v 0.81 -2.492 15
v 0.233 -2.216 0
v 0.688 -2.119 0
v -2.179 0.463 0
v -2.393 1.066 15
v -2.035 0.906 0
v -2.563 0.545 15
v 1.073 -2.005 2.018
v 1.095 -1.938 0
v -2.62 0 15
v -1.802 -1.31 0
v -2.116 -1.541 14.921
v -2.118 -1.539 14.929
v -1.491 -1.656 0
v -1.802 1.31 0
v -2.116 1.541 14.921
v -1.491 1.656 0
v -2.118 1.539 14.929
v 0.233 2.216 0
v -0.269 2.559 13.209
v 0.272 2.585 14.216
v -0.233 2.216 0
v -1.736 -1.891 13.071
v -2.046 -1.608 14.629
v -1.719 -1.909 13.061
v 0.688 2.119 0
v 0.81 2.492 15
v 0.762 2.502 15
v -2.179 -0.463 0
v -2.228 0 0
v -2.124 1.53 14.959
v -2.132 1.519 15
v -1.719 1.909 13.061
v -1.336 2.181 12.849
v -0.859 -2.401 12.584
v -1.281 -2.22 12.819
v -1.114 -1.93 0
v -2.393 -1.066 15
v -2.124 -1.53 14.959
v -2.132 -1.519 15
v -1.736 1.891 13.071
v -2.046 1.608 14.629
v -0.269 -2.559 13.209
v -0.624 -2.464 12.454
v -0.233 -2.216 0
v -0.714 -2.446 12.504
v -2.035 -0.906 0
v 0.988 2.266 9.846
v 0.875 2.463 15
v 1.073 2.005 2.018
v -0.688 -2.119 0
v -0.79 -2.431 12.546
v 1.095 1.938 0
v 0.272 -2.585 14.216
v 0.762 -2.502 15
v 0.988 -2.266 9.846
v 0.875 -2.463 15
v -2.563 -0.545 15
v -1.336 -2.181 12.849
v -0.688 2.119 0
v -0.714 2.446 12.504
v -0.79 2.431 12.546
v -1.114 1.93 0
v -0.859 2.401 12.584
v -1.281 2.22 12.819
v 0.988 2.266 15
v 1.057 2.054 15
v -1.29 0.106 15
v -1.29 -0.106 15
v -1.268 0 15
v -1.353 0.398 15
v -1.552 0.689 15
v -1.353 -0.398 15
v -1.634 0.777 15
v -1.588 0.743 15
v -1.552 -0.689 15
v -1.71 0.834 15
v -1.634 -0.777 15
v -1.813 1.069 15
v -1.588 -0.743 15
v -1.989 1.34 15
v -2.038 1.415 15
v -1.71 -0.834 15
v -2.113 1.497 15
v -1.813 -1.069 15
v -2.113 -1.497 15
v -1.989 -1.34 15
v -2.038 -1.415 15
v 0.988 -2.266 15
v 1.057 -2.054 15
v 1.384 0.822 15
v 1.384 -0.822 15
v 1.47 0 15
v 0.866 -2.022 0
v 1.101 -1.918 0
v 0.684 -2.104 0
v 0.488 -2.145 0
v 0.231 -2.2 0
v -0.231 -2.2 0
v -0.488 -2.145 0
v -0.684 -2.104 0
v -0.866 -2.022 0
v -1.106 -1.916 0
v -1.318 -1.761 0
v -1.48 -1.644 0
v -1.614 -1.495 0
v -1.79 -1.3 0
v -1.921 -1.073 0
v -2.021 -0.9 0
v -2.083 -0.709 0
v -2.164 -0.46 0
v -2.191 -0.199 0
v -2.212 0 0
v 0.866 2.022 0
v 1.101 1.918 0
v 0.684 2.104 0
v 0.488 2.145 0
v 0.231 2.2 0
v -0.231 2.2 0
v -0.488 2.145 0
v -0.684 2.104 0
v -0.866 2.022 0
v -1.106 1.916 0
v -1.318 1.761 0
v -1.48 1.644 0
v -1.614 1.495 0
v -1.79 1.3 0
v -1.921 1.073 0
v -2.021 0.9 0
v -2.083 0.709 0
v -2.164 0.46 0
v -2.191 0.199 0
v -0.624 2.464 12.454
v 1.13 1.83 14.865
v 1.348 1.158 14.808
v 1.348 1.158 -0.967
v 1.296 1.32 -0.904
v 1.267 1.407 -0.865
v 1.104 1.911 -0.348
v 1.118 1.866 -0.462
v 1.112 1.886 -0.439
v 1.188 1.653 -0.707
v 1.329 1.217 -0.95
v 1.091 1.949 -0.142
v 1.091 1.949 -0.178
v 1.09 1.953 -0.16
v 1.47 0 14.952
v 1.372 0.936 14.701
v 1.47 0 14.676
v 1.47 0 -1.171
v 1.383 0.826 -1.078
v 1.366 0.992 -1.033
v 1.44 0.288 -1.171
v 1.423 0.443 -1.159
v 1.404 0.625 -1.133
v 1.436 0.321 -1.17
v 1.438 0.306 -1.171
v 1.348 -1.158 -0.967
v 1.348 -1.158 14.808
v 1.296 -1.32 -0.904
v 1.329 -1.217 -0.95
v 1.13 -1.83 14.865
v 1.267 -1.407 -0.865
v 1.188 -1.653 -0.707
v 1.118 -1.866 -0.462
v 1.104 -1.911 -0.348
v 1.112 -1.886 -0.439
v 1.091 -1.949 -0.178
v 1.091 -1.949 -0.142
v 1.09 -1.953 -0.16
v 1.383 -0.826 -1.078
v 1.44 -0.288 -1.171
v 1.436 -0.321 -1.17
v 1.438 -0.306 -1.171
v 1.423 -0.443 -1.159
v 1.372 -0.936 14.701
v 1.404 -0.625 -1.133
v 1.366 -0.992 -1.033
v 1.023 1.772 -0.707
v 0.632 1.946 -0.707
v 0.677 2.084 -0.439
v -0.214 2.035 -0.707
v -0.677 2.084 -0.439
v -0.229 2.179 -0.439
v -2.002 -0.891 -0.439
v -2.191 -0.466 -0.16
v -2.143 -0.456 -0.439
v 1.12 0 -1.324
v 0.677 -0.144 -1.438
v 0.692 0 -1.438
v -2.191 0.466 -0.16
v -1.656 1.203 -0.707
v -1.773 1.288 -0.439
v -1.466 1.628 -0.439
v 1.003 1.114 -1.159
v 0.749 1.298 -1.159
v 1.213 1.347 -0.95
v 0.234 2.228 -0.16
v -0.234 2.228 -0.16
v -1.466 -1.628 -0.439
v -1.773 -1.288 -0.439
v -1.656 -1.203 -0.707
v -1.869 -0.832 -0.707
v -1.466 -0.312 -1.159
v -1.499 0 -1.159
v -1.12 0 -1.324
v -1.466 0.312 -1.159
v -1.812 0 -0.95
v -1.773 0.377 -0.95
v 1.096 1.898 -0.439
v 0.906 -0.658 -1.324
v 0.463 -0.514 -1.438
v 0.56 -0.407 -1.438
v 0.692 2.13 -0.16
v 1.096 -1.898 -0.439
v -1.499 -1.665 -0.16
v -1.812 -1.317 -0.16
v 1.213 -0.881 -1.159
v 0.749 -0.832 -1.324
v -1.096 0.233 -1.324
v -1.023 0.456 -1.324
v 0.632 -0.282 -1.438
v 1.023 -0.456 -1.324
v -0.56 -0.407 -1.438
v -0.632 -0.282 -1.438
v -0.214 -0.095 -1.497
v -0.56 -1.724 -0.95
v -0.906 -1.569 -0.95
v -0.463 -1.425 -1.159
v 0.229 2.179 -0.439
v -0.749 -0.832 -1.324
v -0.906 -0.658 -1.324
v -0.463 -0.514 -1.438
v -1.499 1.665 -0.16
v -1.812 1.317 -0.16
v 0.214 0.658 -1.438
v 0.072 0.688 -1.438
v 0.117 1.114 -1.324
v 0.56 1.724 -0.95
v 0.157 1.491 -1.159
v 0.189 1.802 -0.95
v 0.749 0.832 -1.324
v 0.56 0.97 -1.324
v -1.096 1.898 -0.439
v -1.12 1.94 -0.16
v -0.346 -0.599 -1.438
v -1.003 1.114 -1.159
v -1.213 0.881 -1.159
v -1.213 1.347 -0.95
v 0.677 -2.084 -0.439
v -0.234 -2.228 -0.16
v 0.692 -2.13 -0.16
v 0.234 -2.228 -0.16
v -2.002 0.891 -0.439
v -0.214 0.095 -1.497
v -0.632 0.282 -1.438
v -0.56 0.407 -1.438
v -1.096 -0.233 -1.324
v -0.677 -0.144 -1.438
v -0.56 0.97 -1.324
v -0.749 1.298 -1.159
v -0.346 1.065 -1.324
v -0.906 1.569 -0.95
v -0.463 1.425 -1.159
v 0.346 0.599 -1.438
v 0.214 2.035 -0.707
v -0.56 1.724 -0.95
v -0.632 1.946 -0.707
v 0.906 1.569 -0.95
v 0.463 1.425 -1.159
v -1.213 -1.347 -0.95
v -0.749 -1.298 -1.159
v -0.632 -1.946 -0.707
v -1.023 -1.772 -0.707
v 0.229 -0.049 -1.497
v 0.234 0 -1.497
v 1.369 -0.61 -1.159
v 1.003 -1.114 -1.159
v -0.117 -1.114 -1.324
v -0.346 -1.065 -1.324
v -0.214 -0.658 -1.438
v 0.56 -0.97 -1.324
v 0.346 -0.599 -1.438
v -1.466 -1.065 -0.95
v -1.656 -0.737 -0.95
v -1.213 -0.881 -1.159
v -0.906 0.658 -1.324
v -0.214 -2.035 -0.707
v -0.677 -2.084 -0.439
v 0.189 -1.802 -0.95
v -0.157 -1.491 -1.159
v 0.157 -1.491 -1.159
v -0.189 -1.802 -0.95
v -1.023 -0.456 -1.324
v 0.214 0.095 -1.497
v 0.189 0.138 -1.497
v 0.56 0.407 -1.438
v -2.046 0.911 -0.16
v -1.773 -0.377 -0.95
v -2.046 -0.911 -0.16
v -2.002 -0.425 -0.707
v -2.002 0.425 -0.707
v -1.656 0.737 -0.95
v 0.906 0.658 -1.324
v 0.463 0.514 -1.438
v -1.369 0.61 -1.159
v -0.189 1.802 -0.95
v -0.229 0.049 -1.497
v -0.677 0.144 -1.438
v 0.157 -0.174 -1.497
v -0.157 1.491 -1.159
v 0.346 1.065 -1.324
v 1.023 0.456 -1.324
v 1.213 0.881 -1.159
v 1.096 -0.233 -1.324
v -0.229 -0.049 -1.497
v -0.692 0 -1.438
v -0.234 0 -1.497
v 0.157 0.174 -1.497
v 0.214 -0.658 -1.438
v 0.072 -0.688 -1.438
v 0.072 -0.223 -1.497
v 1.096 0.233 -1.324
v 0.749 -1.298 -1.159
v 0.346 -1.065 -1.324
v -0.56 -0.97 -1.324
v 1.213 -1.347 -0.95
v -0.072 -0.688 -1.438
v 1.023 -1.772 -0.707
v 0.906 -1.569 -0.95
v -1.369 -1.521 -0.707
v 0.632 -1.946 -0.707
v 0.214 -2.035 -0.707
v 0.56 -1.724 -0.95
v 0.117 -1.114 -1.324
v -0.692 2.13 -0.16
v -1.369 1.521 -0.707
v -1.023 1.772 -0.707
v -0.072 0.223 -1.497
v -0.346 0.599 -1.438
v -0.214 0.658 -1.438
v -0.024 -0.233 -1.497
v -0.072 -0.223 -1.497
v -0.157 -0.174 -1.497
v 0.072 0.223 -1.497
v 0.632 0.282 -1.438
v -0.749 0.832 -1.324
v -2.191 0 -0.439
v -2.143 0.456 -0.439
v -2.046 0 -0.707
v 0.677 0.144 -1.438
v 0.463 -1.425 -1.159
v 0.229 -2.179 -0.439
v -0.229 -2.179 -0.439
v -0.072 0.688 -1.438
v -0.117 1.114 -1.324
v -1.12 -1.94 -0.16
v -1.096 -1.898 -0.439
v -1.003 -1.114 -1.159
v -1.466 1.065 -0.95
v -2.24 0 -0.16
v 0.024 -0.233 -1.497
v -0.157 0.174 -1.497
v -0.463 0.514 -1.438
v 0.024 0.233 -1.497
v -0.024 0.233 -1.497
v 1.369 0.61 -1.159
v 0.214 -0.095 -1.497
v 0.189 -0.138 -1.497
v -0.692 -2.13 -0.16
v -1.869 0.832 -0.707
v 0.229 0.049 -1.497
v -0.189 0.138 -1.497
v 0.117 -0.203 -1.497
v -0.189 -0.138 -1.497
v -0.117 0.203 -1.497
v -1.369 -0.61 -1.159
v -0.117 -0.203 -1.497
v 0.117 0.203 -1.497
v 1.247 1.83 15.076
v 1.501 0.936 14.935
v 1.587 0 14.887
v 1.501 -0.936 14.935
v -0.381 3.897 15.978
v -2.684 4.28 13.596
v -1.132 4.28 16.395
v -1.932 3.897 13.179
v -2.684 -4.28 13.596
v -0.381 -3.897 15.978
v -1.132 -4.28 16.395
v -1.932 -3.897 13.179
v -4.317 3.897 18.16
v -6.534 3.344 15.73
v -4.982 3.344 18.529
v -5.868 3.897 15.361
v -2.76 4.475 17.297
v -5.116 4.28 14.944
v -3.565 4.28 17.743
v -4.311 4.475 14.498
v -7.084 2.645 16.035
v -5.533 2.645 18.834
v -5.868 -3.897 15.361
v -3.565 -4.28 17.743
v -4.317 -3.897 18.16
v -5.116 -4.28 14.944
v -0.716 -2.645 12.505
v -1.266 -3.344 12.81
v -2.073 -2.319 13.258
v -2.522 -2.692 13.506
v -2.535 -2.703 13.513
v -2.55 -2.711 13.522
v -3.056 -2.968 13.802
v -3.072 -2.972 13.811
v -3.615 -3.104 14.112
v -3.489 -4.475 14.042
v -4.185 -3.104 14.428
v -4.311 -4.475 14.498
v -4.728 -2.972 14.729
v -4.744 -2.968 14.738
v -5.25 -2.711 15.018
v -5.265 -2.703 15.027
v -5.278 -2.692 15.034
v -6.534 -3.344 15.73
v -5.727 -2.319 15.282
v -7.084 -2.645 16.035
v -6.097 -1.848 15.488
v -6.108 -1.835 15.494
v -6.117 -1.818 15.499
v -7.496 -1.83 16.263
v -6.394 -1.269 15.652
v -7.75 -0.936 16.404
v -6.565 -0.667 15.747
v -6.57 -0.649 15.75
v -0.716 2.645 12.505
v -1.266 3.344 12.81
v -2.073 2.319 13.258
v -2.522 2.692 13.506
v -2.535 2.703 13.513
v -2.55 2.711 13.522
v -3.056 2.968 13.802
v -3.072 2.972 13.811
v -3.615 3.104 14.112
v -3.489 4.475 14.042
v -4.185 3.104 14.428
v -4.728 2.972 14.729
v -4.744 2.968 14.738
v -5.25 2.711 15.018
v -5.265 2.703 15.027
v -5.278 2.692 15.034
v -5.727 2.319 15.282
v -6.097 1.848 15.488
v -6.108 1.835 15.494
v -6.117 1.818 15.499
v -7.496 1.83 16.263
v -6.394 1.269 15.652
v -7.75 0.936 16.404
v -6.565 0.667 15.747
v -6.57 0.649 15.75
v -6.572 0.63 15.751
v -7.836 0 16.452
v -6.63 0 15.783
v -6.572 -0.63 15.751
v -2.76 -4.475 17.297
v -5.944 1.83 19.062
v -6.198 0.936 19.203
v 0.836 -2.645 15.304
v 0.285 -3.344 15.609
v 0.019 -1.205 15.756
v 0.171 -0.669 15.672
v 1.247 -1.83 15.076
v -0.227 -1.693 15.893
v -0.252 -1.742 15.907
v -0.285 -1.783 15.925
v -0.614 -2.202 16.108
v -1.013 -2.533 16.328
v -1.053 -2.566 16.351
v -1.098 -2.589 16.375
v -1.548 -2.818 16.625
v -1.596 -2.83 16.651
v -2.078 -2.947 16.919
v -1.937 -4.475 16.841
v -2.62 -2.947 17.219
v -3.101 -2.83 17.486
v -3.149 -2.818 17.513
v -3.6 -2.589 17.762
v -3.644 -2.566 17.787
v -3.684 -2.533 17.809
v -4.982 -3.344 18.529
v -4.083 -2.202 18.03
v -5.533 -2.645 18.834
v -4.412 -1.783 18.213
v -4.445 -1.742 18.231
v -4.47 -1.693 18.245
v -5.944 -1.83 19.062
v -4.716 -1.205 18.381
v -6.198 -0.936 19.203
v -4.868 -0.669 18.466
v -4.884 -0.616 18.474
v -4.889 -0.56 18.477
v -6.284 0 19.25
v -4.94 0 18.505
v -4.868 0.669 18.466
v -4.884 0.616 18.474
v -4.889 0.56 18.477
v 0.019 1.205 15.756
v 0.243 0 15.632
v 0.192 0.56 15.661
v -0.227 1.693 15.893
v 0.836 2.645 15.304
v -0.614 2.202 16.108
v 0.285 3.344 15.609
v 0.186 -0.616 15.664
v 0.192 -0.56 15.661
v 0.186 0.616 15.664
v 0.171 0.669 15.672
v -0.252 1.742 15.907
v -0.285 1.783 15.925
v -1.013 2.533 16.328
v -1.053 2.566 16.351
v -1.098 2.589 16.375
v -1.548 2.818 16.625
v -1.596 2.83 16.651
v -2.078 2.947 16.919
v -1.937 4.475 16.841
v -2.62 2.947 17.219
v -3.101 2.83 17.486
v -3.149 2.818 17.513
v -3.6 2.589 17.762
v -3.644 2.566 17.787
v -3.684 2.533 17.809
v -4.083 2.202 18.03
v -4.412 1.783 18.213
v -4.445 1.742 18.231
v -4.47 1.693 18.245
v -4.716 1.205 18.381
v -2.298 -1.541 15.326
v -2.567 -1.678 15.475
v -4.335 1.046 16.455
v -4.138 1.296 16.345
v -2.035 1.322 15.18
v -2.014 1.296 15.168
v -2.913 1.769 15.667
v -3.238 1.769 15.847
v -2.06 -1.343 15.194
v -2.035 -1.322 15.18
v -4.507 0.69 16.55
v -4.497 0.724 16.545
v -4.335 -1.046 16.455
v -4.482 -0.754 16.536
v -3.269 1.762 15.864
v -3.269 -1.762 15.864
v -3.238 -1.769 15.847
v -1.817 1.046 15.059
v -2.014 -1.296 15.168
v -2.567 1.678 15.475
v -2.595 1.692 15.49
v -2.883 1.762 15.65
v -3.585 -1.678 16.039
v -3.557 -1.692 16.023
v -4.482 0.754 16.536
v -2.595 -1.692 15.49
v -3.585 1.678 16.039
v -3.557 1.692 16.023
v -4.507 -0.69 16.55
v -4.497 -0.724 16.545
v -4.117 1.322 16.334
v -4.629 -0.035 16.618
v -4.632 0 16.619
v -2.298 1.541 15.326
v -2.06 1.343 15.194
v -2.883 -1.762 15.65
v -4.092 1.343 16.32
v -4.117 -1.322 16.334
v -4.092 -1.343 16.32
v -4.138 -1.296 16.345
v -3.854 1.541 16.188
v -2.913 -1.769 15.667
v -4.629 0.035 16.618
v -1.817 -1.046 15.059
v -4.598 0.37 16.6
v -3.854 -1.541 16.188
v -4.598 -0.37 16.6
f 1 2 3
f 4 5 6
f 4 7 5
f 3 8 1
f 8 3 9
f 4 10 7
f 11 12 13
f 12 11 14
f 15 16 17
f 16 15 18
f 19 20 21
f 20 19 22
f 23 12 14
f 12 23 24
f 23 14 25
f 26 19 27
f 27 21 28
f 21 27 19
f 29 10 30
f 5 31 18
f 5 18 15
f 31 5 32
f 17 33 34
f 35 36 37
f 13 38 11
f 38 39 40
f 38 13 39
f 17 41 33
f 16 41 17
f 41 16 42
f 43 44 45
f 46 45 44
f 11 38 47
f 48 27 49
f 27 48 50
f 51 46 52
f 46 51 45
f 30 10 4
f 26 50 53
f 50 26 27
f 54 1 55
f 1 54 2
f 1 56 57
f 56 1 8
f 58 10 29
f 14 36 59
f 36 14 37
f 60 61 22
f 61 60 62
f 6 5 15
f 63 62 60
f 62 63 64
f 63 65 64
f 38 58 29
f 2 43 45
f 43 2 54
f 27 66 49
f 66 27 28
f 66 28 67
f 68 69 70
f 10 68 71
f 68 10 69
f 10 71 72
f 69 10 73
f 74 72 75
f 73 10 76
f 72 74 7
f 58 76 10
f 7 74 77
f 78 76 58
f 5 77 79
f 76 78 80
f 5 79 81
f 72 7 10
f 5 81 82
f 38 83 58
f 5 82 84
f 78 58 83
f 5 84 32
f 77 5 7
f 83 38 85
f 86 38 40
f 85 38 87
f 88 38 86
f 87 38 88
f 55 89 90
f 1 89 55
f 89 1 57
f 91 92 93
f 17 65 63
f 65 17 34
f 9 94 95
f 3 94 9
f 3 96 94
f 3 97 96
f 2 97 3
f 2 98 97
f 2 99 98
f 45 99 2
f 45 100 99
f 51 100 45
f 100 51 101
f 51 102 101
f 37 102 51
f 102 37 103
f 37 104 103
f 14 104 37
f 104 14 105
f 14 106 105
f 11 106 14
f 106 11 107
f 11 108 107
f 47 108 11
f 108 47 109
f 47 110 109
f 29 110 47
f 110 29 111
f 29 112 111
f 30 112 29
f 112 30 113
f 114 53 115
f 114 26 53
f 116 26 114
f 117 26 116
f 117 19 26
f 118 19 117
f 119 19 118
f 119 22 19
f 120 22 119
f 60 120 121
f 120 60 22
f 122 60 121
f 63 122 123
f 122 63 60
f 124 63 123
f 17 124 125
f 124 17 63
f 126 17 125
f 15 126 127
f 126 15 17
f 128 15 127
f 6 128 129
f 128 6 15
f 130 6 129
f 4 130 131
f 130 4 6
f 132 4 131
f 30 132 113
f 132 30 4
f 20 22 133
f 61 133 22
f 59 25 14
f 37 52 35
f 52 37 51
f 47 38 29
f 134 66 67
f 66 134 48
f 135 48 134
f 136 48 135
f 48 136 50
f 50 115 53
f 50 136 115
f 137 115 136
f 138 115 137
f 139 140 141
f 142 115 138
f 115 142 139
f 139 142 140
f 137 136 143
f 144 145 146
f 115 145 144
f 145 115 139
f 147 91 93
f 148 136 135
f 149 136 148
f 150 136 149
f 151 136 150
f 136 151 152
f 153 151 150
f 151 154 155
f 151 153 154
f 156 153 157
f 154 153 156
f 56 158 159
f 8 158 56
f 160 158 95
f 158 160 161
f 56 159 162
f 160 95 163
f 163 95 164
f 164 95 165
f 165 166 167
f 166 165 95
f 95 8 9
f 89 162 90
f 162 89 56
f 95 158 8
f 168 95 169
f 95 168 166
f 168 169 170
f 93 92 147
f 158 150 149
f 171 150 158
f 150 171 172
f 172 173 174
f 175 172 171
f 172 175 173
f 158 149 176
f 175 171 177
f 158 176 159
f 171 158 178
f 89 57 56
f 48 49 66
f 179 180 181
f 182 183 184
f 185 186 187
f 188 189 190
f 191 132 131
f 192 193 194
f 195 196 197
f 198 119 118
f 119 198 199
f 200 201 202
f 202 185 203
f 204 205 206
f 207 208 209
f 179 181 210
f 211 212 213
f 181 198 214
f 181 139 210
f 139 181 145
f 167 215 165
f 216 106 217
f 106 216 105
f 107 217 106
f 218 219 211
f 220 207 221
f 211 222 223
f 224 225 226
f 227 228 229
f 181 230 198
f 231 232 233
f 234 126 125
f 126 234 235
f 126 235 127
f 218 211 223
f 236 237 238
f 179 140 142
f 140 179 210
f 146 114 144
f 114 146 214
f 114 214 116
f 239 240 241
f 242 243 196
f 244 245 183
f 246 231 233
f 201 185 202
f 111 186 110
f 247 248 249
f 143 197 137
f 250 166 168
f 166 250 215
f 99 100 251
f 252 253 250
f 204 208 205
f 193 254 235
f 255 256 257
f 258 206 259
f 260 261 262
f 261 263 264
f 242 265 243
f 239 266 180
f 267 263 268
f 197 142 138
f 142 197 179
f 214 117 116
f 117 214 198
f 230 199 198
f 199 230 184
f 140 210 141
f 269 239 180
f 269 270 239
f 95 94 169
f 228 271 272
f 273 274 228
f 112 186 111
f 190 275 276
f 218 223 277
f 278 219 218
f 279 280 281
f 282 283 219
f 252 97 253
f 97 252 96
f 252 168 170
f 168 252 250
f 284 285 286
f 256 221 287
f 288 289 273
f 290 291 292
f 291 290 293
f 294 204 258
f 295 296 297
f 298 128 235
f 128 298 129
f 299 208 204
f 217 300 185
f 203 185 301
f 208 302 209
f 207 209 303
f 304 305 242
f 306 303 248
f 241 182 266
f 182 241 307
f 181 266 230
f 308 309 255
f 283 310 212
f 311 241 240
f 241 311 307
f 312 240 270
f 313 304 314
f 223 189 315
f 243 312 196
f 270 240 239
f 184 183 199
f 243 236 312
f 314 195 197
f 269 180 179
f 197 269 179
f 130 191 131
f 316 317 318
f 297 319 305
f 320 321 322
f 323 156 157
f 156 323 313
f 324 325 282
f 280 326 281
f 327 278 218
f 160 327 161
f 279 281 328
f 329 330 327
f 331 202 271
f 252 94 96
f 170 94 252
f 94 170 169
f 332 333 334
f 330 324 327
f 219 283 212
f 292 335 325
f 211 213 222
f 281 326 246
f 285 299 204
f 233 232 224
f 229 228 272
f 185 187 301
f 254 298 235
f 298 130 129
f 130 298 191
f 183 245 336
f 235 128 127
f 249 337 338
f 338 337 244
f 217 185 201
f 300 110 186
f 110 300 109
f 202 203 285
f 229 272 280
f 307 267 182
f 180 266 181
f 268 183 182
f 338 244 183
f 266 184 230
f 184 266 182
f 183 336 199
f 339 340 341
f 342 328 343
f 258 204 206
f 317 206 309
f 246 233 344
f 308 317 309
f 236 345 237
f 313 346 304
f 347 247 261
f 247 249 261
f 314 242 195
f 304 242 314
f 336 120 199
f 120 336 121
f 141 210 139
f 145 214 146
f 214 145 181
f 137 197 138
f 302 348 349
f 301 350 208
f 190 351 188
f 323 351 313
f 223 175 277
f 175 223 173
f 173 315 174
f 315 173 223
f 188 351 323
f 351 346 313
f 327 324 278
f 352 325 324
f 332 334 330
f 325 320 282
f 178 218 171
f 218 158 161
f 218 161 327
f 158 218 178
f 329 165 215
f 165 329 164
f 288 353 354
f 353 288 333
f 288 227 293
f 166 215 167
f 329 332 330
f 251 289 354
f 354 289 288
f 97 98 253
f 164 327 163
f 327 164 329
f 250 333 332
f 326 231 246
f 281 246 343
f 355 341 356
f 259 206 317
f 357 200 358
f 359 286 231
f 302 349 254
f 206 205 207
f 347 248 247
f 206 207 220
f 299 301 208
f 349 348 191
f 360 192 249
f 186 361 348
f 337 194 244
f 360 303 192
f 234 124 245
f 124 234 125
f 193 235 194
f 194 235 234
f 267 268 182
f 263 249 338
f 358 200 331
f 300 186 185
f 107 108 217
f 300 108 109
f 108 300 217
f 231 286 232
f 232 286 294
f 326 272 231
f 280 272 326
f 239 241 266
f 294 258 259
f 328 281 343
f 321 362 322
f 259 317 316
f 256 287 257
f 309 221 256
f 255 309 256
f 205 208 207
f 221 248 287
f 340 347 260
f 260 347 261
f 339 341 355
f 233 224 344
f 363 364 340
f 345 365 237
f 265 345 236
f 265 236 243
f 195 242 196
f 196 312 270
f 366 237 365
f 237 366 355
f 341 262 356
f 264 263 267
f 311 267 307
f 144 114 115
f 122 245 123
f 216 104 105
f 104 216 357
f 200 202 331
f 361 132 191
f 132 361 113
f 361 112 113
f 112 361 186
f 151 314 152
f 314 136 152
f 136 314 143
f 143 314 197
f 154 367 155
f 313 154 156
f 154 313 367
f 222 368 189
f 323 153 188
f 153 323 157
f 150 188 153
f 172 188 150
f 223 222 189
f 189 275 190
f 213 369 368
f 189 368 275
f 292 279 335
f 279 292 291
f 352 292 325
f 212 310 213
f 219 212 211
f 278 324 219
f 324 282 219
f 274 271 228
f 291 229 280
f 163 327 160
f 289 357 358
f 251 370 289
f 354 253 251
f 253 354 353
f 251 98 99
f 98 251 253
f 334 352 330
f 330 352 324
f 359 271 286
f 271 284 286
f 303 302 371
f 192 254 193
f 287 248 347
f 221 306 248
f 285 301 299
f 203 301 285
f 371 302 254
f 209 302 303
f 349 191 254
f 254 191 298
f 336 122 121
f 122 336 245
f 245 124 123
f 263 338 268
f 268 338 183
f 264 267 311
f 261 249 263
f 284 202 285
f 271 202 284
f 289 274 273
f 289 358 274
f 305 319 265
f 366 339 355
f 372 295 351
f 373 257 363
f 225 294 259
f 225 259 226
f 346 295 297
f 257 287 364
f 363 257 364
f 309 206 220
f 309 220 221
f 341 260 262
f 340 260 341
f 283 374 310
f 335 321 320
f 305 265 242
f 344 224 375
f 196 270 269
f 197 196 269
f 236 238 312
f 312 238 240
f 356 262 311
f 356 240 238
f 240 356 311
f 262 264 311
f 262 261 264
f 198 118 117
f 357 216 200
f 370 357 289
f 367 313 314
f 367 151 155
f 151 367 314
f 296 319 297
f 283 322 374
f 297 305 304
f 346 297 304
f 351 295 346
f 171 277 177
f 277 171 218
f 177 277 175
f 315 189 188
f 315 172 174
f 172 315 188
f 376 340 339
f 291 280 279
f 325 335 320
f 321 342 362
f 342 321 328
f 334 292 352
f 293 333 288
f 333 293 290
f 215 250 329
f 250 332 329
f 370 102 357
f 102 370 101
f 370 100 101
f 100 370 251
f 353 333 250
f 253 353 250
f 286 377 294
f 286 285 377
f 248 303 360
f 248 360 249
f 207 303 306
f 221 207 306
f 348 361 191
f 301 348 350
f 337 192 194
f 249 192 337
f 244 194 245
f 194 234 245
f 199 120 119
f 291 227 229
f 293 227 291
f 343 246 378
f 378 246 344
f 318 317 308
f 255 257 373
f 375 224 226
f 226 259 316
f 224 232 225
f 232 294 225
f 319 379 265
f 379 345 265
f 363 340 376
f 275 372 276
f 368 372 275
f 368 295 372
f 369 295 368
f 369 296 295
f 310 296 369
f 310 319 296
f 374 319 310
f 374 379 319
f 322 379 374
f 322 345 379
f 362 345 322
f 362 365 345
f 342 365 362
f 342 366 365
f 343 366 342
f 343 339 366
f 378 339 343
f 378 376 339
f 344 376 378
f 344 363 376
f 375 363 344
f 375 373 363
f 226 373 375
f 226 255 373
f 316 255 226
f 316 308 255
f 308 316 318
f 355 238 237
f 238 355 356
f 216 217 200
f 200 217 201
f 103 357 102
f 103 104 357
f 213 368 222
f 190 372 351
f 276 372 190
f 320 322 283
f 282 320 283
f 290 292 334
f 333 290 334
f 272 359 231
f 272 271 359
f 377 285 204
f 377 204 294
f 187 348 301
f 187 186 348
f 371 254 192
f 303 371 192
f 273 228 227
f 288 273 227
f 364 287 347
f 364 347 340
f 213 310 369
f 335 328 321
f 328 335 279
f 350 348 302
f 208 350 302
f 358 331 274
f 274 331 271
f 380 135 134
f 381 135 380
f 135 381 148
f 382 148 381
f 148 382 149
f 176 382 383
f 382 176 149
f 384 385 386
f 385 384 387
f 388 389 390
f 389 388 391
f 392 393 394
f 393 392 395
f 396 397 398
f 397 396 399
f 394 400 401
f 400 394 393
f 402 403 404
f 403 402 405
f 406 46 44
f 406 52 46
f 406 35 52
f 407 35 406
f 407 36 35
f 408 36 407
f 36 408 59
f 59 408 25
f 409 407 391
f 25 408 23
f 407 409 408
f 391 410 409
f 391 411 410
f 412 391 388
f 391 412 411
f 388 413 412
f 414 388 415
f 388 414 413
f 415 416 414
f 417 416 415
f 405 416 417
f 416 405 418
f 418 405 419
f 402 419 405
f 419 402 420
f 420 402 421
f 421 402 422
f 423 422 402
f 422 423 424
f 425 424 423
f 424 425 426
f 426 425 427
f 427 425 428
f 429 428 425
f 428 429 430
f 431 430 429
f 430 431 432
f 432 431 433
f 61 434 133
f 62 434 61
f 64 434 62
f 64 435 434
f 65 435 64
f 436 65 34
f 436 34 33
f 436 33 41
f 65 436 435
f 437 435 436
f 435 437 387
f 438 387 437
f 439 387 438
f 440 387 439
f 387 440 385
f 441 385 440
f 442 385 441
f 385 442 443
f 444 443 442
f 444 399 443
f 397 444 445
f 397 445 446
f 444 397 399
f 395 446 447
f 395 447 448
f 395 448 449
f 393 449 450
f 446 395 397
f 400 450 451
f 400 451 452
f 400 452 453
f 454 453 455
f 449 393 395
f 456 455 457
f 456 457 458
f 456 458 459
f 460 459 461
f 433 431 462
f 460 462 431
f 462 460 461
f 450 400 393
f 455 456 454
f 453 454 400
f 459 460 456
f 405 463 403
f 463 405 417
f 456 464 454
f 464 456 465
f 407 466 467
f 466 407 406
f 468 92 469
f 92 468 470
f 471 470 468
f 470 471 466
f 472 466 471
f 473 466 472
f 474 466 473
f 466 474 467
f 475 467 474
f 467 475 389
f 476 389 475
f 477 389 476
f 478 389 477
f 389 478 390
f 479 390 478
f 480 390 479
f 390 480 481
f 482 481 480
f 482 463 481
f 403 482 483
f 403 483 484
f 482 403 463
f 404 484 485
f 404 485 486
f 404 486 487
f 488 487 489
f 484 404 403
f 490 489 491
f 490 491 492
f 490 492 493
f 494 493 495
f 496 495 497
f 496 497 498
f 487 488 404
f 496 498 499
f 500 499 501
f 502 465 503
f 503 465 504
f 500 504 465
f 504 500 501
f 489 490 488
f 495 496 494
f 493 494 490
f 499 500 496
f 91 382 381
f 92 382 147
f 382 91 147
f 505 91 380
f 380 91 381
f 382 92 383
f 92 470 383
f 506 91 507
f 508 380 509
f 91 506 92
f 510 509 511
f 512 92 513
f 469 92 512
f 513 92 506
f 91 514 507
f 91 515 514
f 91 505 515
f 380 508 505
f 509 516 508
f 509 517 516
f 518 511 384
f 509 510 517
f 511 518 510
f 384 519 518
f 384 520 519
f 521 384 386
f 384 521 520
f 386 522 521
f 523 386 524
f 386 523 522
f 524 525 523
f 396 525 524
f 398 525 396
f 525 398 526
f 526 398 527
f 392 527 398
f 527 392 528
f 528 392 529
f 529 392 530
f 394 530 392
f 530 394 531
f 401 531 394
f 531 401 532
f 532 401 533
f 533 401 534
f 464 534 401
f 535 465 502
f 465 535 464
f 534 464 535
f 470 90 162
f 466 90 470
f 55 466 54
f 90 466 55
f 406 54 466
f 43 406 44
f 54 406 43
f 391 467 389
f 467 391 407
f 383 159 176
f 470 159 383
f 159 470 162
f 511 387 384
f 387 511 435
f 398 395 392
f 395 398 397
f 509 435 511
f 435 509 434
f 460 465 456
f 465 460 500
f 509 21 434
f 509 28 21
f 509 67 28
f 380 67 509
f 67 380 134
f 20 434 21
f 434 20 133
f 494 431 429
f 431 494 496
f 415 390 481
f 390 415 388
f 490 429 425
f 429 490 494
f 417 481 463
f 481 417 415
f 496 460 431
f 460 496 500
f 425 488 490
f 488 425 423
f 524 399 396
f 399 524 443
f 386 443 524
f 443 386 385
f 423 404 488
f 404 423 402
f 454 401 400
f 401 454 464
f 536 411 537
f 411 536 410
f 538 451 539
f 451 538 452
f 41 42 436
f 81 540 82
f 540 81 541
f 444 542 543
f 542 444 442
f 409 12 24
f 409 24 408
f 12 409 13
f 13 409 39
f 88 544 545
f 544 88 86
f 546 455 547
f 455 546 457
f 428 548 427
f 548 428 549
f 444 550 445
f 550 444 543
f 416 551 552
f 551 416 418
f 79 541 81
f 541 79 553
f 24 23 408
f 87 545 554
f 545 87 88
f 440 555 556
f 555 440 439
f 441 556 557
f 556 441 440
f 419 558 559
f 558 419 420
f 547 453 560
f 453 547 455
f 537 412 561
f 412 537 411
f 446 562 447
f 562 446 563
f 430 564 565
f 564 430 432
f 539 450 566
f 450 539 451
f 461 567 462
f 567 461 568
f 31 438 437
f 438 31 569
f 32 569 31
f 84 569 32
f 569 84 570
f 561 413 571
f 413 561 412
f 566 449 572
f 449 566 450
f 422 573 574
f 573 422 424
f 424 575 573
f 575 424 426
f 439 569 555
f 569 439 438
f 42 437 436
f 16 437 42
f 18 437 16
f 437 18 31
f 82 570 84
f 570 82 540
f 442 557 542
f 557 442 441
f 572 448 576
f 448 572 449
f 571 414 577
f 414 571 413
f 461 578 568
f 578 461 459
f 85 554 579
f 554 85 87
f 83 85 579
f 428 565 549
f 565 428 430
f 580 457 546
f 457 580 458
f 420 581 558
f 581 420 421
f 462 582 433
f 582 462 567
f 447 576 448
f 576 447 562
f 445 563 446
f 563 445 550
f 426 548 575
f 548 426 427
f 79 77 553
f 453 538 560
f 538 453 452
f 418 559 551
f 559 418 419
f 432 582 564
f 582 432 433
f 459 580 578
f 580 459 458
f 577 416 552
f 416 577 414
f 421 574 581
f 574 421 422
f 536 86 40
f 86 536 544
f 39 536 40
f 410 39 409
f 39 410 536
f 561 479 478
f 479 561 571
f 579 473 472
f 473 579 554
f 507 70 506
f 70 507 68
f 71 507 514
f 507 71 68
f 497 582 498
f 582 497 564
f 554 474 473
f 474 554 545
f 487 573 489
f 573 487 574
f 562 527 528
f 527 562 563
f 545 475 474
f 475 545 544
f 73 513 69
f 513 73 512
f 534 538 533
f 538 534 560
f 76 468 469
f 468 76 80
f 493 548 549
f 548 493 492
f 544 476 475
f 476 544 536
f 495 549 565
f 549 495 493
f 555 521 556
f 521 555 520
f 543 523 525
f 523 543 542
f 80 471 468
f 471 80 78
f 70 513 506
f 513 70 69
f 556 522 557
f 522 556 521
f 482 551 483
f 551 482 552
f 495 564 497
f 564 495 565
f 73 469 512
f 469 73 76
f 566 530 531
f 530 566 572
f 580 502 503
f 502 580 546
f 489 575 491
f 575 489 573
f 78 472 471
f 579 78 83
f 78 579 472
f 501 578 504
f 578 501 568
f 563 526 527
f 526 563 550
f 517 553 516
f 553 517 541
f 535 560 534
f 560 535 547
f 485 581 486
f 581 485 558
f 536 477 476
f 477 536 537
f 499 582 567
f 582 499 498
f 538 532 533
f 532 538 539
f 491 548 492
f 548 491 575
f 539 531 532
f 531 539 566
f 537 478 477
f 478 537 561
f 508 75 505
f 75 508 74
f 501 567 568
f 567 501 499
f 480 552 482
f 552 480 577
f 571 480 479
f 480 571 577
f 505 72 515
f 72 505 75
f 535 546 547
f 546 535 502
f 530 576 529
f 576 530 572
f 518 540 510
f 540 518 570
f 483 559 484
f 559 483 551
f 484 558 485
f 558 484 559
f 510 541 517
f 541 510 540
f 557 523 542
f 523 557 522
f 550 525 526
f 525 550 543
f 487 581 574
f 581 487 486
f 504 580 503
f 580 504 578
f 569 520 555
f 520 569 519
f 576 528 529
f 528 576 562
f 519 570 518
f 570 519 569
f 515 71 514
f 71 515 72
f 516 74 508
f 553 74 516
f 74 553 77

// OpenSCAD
//rotate([0,0,90]) {

$fn=30;


union() {
    /* Shaft */
    intersection() {
        intersection() {
            cylinder(h=15, r1=2.228, r2=2.62);
            translate([-4.1,0,0]) {
                cylinder(h=15, r1=5.57, r2=5.57);
            }
        }
    }
    
    /* Shaft tip */
    intersection() {
        translate([-4.1,0,-5]) {
            cylinder(h=15, r1=5.57, r2=5.57);
        }
        translate([0,0,-0.16]) {
            scale([1,1,0.6]) {
                sphere(2.24);
            }
        }
    }

    /* Donut */
    translate([-3.9,0,14.27]) {
        rotate([0,29,0]) {
            difference() {
                cylinder(h=3.2, r=4.5);
                translate([0,0,-0.1]) {
                    cylinder(h=1.9, r1=3.2, r2=1.7);
                }
                translate([0, 0, 1.6]) {
                    cylinder(h=1.9, r1=1.7, r2=3.2);
                }
            }
        }
    }


}

//}
//translate(
//sphere(3);
